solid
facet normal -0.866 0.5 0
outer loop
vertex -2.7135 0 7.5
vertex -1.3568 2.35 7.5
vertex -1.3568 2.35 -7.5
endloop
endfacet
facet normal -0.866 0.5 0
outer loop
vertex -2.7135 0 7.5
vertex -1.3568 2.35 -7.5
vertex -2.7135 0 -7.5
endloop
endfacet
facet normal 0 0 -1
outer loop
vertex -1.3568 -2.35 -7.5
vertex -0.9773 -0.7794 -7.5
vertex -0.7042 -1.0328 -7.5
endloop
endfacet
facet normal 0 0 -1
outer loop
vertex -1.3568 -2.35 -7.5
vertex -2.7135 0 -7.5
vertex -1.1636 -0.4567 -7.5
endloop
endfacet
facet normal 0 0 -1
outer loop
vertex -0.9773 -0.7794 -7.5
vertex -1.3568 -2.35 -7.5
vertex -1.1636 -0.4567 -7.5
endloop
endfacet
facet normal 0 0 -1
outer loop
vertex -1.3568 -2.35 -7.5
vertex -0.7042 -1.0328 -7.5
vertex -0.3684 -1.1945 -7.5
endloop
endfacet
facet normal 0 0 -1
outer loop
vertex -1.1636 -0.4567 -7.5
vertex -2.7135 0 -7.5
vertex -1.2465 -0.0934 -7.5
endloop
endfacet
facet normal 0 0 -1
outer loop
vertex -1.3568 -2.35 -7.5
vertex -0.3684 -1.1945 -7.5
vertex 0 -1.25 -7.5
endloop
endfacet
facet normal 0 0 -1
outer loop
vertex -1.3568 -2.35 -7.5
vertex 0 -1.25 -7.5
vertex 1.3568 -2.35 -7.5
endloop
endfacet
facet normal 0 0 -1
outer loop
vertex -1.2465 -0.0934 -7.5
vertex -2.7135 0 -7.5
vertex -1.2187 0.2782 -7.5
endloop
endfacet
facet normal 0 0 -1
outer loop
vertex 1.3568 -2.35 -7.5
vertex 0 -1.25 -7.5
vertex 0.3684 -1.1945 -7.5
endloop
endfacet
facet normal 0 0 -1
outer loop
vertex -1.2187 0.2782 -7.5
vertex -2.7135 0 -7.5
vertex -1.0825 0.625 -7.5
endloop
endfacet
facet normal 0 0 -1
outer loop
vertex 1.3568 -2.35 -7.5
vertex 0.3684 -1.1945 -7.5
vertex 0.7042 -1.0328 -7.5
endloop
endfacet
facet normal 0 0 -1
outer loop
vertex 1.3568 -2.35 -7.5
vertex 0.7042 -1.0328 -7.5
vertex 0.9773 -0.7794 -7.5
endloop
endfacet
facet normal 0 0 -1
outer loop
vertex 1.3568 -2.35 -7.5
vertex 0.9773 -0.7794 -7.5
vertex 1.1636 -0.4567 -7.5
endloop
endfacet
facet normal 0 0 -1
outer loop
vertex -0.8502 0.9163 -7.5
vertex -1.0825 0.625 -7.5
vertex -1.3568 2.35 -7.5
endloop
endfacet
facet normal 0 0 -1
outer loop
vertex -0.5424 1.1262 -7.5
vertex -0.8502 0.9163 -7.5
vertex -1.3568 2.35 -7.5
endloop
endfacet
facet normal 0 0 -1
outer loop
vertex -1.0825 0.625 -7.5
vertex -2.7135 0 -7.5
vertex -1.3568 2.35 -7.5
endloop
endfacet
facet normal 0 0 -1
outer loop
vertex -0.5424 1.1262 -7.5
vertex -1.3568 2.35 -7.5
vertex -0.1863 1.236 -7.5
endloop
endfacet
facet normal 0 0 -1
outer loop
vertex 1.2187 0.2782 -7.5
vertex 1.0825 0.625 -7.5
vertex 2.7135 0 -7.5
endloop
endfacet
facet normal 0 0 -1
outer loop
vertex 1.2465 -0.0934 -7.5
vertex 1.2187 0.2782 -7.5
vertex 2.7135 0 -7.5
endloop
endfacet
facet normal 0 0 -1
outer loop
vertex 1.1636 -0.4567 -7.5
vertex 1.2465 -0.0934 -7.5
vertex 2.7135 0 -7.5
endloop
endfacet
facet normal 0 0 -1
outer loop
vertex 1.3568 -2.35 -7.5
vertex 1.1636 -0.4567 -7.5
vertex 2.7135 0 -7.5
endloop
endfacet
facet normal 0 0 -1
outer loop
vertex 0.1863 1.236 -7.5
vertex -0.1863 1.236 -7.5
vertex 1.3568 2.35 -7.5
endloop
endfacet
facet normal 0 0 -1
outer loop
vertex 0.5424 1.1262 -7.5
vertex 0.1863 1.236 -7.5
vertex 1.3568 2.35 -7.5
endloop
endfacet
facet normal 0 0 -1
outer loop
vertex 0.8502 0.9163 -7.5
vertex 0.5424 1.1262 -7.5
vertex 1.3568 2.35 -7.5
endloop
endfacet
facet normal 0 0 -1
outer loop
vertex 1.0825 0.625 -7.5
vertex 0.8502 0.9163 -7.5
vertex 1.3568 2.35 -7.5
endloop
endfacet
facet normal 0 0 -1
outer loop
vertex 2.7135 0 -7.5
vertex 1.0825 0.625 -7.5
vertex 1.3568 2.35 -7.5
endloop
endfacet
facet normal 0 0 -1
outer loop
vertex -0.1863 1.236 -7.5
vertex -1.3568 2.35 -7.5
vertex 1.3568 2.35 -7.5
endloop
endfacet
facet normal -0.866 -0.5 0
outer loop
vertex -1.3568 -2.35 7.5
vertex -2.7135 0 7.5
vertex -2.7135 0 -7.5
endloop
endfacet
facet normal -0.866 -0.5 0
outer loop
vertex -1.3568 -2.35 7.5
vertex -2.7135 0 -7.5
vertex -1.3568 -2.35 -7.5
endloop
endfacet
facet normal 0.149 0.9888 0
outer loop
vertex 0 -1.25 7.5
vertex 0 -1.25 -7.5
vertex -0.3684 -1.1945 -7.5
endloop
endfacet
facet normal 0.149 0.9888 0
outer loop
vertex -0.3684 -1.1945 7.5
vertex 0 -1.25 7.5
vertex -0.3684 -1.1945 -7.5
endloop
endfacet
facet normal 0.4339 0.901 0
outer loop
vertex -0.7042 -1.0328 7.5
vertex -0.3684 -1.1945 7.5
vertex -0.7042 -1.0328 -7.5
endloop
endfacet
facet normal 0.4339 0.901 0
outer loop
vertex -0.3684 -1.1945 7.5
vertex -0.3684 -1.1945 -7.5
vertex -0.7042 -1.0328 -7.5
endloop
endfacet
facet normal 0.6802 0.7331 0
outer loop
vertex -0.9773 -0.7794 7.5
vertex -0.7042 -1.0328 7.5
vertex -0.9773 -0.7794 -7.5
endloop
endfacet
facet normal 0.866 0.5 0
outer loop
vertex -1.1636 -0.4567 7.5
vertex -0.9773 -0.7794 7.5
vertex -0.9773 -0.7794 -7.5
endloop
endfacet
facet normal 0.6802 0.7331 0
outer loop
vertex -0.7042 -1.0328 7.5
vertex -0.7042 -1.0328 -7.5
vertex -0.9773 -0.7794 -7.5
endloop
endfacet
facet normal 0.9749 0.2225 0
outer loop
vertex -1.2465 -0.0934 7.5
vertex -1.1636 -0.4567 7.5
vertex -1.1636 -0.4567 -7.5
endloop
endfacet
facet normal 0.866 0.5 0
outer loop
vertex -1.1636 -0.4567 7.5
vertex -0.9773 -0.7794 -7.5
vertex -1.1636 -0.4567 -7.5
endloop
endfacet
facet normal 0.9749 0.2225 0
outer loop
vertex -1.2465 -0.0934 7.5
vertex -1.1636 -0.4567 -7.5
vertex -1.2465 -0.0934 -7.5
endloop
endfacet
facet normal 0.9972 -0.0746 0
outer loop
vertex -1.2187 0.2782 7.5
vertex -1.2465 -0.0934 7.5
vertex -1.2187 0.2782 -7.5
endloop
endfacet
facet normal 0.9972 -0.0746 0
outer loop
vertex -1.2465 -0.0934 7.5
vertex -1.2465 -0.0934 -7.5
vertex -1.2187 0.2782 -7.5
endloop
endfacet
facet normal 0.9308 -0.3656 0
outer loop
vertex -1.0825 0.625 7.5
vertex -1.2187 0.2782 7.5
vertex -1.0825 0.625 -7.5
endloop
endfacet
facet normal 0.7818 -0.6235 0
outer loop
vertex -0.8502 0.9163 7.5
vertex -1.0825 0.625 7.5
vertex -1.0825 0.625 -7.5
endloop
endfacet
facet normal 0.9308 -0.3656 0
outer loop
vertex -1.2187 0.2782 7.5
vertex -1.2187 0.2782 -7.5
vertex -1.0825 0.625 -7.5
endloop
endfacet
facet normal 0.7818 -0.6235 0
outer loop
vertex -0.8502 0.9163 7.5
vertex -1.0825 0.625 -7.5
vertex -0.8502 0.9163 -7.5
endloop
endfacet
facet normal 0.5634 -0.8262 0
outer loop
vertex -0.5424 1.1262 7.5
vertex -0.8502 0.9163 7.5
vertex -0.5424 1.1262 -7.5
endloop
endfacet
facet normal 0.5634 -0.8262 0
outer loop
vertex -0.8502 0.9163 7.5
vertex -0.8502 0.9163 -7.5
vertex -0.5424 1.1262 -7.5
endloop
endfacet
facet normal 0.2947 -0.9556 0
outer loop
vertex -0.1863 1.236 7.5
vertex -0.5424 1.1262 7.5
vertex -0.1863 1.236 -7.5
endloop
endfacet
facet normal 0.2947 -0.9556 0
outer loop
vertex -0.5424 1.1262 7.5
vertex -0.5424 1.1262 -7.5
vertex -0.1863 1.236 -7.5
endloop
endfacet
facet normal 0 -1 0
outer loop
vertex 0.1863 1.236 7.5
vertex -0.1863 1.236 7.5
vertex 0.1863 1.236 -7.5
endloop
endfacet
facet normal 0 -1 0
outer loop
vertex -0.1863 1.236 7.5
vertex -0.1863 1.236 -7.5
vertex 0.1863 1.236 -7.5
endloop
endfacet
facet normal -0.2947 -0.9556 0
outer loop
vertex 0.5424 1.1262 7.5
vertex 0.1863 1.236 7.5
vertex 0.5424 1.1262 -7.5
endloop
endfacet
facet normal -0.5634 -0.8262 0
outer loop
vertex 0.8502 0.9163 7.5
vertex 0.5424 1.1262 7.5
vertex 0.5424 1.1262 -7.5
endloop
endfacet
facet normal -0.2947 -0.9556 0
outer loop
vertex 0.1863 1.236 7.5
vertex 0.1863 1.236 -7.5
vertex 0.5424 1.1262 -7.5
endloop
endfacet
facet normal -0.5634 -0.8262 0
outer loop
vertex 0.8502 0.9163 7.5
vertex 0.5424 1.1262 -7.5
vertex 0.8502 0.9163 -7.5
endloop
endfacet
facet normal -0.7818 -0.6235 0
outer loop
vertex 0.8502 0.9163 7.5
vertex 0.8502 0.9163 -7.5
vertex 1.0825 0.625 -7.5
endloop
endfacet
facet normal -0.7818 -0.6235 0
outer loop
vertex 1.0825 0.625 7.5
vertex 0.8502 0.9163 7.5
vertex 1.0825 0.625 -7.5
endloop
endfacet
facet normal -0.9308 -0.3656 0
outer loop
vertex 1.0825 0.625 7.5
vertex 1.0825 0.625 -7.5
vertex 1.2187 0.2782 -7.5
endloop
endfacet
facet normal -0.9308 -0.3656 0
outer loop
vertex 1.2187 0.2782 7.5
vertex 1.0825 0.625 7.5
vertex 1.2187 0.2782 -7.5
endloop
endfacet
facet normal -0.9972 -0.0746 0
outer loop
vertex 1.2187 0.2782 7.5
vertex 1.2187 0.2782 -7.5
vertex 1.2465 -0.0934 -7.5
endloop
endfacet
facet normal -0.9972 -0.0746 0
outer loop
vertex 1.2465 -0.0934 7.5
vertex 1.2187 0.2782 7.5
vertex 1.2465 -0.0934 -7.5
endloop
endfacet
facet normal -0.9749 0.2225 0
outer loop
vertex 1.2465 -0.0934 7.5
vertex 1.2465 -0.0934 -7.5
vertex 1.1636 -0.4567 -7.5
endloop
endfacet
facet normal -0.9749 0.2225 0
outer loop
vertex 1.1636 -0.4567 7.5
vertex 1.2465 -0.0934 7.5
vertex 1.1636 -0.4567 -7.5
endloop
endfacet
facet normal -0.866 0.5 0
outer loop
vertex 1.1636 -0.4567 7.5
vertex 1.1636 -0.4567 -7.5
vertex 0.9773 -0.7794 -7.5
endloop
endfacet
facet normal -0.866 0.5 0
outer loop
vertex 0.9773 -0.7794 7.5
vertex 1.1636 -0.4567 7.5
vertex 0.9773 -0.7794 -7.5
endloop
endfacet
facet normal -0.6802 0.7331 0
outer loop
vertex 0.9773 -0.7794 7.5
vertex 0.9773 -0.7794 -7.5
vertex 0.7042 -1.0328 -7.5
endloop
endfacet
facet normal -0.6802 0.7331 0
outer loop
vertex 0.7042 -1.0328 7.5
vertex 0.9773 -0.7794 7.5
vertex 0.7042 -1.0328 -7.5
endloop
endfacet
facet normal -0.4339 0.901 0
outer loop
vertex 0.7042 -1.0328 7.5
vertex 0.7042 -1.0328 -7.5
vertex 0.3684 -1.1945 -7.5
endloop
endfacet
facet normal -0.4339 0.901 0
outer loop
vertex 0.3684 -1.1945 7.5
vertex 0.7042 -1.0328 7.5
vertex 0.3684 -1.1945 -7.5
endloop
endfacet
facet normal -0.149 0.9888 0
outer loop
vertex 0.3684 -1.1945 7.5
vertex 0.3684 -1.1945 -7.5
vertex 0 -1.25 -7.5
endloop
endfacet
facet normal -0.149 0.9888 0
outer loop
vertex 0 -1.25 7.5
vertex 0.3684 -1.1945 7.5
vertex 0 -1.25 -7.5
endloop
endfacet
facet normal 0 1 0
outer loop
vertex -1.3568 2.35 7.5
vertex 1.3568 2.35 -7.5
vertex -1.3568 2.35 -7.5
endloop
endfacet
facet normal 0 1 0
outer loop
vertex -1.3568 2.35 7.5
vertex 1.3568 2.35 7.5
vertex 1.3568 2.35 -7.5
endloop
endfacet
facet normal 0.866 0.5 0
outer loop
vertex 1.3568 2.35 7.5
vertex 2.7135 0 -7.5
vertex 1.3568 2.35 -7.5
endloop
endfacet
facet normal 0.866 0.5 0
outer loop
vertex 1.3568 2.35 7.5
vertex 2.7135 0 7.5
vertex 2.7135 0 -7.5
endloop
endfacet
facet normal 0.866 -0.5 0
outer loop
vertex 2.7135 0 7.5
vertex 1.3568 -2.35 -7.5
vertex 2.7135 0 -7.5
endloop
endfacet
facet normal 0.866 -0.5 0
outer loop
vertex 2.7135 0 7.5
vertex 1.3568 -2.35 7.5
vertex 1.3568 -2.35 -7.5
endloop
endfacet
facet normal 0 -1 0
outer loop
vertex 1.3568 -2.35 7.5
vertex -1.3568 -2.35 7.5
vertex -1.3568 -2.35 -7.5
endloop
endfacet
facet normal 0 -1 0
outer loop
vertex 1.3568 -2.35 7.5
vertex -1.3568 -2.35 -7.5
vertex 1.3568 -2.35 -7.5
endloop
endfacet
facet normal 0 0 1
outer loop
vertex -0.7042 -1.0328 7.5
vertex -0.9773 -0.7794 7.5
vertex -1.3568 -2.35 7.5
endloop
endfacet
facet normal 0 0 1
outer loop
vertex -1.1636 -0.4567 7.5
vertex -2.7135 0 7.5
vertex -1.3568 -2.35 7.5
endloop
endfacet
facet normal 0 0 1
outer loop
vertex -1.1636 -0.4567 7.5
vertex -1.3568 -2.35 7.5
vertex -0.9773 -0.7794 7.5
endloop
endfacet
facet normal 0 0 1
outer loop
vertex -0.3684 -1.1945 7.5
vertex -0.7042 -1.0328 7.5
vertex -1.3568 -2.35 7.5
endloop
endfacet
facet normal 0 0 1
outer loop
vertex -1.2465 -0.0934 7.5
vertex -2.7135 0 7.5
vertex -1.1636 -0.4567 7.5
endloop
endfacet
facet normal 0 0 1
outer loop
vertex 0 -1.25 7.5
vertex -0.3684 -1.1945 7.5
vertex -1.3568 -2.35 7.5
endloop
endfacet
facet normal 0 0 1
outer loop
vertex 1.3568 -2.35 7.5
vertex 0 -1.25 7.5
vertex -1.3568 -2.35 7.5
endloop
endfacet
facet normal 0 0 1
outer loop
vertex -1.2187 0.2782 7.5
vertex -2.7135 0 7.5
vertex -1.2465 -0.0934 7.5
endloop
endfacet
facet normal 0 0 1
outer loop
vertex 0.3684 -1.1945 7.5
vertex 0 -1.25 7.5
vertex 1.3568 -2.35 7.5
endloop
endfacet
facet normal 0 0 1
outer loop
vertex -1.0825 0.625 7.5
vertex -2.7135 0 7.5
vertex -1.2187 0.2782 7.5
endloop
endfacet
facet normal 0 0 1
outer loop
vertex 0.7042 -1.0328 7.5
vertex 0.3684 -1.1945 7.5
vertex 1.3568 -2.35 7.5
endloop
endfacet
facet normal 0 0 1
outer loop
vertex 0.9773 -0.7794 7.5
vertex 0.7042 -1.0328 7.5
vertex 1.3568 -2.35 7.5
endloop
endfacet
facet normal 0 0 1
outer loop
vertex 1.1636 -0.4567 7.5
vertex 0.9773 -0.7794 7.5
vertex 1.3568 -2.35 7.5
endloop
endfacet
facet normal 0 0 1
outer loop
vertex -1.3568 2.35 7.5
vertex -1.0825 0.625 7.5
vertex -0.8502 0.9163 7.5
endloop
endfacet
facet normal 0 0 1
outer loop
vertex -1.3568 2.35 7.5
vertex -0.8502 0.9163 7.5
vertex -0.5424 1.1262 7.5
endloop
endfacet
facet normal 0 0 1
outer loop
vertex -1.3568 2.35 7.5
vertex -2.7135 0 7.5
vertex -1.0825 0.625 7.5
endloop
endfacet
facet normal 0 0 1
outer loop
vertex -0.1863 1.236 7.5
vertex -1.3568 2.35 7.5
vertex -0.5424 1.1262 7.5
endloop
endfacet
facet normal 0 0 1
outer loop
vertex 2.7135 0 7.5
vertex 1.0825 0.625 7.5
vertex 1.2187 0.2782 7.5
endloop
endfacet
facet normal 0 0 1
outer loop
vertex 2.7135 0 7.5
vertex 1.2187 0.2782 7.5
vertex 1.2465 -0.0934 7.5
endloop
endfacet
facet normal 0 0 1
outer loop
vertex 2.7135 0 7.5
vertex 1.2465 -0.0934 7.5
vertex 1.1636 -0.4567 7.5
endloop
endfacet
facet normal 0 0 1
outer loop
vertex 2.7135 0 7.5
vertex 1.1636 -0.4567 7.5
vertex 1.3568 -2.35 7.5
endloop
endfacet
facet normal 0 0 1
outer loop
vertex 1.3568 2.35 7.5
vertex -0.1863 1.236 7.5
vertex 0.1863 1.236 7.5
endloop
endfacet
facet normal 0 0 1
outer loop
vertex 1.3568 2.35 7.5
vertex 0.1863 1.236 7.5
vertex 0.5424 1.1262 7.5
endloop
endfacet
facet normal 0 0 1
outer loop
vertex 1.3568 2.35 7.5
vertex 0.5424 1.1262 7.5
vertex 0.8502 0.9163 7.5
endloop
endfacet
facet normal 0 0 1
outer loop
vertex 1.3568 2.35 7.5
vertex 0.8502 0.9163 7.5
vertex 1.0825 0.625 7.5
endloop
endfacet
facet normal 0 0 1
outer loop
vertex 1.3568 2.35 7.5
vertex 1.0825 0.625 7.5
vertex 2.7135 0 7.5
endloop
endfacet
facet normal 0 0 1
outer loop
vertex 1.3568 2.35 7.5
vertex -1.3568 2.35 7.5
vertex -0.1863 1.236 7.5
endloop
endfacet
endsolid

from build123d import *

# Parameters (mm, degrees)
EXTRUDE_1_DEPTH = 7.5


with BuildPart() as part:
    # 草图1 → 凸台-拉伸1 (new body, symmetric)
    with BuildSketch(Plane.XY):
        Polygon((1.356773133, 2.35), (-1.356773133, 2.35), (-2.713546265, 0), (-1.356773133, -2.35), (1.356773133, -2.35), (2.713546265, 0), align=None)
    extrude(amount=EXTRUDE_1_DEPTH, both=True)

    # 草图3 → Hole Wizard 387 (revolve, cut)
    with BuildSketch(Plane(origin=(0, 0, 7.5), x_dir=(0, -1, 0), z_dir=(1, 0, 0))):
        Polygon((0, 0), (0, 8.751075774), (1.25, 8), (1.25, 0), align=None)
    hole_wizard_387 = revolve(axis=Axis((0, 0, 13.85), (0, 0, -1)), mode=Mode.SUBTRACT)

    # 镜向1: Hole Wizard 387 across plane
    add(hole_wizard_387.mirror(Plane.XY), mode=Mode.SUBTRACT)


solid = part.part
